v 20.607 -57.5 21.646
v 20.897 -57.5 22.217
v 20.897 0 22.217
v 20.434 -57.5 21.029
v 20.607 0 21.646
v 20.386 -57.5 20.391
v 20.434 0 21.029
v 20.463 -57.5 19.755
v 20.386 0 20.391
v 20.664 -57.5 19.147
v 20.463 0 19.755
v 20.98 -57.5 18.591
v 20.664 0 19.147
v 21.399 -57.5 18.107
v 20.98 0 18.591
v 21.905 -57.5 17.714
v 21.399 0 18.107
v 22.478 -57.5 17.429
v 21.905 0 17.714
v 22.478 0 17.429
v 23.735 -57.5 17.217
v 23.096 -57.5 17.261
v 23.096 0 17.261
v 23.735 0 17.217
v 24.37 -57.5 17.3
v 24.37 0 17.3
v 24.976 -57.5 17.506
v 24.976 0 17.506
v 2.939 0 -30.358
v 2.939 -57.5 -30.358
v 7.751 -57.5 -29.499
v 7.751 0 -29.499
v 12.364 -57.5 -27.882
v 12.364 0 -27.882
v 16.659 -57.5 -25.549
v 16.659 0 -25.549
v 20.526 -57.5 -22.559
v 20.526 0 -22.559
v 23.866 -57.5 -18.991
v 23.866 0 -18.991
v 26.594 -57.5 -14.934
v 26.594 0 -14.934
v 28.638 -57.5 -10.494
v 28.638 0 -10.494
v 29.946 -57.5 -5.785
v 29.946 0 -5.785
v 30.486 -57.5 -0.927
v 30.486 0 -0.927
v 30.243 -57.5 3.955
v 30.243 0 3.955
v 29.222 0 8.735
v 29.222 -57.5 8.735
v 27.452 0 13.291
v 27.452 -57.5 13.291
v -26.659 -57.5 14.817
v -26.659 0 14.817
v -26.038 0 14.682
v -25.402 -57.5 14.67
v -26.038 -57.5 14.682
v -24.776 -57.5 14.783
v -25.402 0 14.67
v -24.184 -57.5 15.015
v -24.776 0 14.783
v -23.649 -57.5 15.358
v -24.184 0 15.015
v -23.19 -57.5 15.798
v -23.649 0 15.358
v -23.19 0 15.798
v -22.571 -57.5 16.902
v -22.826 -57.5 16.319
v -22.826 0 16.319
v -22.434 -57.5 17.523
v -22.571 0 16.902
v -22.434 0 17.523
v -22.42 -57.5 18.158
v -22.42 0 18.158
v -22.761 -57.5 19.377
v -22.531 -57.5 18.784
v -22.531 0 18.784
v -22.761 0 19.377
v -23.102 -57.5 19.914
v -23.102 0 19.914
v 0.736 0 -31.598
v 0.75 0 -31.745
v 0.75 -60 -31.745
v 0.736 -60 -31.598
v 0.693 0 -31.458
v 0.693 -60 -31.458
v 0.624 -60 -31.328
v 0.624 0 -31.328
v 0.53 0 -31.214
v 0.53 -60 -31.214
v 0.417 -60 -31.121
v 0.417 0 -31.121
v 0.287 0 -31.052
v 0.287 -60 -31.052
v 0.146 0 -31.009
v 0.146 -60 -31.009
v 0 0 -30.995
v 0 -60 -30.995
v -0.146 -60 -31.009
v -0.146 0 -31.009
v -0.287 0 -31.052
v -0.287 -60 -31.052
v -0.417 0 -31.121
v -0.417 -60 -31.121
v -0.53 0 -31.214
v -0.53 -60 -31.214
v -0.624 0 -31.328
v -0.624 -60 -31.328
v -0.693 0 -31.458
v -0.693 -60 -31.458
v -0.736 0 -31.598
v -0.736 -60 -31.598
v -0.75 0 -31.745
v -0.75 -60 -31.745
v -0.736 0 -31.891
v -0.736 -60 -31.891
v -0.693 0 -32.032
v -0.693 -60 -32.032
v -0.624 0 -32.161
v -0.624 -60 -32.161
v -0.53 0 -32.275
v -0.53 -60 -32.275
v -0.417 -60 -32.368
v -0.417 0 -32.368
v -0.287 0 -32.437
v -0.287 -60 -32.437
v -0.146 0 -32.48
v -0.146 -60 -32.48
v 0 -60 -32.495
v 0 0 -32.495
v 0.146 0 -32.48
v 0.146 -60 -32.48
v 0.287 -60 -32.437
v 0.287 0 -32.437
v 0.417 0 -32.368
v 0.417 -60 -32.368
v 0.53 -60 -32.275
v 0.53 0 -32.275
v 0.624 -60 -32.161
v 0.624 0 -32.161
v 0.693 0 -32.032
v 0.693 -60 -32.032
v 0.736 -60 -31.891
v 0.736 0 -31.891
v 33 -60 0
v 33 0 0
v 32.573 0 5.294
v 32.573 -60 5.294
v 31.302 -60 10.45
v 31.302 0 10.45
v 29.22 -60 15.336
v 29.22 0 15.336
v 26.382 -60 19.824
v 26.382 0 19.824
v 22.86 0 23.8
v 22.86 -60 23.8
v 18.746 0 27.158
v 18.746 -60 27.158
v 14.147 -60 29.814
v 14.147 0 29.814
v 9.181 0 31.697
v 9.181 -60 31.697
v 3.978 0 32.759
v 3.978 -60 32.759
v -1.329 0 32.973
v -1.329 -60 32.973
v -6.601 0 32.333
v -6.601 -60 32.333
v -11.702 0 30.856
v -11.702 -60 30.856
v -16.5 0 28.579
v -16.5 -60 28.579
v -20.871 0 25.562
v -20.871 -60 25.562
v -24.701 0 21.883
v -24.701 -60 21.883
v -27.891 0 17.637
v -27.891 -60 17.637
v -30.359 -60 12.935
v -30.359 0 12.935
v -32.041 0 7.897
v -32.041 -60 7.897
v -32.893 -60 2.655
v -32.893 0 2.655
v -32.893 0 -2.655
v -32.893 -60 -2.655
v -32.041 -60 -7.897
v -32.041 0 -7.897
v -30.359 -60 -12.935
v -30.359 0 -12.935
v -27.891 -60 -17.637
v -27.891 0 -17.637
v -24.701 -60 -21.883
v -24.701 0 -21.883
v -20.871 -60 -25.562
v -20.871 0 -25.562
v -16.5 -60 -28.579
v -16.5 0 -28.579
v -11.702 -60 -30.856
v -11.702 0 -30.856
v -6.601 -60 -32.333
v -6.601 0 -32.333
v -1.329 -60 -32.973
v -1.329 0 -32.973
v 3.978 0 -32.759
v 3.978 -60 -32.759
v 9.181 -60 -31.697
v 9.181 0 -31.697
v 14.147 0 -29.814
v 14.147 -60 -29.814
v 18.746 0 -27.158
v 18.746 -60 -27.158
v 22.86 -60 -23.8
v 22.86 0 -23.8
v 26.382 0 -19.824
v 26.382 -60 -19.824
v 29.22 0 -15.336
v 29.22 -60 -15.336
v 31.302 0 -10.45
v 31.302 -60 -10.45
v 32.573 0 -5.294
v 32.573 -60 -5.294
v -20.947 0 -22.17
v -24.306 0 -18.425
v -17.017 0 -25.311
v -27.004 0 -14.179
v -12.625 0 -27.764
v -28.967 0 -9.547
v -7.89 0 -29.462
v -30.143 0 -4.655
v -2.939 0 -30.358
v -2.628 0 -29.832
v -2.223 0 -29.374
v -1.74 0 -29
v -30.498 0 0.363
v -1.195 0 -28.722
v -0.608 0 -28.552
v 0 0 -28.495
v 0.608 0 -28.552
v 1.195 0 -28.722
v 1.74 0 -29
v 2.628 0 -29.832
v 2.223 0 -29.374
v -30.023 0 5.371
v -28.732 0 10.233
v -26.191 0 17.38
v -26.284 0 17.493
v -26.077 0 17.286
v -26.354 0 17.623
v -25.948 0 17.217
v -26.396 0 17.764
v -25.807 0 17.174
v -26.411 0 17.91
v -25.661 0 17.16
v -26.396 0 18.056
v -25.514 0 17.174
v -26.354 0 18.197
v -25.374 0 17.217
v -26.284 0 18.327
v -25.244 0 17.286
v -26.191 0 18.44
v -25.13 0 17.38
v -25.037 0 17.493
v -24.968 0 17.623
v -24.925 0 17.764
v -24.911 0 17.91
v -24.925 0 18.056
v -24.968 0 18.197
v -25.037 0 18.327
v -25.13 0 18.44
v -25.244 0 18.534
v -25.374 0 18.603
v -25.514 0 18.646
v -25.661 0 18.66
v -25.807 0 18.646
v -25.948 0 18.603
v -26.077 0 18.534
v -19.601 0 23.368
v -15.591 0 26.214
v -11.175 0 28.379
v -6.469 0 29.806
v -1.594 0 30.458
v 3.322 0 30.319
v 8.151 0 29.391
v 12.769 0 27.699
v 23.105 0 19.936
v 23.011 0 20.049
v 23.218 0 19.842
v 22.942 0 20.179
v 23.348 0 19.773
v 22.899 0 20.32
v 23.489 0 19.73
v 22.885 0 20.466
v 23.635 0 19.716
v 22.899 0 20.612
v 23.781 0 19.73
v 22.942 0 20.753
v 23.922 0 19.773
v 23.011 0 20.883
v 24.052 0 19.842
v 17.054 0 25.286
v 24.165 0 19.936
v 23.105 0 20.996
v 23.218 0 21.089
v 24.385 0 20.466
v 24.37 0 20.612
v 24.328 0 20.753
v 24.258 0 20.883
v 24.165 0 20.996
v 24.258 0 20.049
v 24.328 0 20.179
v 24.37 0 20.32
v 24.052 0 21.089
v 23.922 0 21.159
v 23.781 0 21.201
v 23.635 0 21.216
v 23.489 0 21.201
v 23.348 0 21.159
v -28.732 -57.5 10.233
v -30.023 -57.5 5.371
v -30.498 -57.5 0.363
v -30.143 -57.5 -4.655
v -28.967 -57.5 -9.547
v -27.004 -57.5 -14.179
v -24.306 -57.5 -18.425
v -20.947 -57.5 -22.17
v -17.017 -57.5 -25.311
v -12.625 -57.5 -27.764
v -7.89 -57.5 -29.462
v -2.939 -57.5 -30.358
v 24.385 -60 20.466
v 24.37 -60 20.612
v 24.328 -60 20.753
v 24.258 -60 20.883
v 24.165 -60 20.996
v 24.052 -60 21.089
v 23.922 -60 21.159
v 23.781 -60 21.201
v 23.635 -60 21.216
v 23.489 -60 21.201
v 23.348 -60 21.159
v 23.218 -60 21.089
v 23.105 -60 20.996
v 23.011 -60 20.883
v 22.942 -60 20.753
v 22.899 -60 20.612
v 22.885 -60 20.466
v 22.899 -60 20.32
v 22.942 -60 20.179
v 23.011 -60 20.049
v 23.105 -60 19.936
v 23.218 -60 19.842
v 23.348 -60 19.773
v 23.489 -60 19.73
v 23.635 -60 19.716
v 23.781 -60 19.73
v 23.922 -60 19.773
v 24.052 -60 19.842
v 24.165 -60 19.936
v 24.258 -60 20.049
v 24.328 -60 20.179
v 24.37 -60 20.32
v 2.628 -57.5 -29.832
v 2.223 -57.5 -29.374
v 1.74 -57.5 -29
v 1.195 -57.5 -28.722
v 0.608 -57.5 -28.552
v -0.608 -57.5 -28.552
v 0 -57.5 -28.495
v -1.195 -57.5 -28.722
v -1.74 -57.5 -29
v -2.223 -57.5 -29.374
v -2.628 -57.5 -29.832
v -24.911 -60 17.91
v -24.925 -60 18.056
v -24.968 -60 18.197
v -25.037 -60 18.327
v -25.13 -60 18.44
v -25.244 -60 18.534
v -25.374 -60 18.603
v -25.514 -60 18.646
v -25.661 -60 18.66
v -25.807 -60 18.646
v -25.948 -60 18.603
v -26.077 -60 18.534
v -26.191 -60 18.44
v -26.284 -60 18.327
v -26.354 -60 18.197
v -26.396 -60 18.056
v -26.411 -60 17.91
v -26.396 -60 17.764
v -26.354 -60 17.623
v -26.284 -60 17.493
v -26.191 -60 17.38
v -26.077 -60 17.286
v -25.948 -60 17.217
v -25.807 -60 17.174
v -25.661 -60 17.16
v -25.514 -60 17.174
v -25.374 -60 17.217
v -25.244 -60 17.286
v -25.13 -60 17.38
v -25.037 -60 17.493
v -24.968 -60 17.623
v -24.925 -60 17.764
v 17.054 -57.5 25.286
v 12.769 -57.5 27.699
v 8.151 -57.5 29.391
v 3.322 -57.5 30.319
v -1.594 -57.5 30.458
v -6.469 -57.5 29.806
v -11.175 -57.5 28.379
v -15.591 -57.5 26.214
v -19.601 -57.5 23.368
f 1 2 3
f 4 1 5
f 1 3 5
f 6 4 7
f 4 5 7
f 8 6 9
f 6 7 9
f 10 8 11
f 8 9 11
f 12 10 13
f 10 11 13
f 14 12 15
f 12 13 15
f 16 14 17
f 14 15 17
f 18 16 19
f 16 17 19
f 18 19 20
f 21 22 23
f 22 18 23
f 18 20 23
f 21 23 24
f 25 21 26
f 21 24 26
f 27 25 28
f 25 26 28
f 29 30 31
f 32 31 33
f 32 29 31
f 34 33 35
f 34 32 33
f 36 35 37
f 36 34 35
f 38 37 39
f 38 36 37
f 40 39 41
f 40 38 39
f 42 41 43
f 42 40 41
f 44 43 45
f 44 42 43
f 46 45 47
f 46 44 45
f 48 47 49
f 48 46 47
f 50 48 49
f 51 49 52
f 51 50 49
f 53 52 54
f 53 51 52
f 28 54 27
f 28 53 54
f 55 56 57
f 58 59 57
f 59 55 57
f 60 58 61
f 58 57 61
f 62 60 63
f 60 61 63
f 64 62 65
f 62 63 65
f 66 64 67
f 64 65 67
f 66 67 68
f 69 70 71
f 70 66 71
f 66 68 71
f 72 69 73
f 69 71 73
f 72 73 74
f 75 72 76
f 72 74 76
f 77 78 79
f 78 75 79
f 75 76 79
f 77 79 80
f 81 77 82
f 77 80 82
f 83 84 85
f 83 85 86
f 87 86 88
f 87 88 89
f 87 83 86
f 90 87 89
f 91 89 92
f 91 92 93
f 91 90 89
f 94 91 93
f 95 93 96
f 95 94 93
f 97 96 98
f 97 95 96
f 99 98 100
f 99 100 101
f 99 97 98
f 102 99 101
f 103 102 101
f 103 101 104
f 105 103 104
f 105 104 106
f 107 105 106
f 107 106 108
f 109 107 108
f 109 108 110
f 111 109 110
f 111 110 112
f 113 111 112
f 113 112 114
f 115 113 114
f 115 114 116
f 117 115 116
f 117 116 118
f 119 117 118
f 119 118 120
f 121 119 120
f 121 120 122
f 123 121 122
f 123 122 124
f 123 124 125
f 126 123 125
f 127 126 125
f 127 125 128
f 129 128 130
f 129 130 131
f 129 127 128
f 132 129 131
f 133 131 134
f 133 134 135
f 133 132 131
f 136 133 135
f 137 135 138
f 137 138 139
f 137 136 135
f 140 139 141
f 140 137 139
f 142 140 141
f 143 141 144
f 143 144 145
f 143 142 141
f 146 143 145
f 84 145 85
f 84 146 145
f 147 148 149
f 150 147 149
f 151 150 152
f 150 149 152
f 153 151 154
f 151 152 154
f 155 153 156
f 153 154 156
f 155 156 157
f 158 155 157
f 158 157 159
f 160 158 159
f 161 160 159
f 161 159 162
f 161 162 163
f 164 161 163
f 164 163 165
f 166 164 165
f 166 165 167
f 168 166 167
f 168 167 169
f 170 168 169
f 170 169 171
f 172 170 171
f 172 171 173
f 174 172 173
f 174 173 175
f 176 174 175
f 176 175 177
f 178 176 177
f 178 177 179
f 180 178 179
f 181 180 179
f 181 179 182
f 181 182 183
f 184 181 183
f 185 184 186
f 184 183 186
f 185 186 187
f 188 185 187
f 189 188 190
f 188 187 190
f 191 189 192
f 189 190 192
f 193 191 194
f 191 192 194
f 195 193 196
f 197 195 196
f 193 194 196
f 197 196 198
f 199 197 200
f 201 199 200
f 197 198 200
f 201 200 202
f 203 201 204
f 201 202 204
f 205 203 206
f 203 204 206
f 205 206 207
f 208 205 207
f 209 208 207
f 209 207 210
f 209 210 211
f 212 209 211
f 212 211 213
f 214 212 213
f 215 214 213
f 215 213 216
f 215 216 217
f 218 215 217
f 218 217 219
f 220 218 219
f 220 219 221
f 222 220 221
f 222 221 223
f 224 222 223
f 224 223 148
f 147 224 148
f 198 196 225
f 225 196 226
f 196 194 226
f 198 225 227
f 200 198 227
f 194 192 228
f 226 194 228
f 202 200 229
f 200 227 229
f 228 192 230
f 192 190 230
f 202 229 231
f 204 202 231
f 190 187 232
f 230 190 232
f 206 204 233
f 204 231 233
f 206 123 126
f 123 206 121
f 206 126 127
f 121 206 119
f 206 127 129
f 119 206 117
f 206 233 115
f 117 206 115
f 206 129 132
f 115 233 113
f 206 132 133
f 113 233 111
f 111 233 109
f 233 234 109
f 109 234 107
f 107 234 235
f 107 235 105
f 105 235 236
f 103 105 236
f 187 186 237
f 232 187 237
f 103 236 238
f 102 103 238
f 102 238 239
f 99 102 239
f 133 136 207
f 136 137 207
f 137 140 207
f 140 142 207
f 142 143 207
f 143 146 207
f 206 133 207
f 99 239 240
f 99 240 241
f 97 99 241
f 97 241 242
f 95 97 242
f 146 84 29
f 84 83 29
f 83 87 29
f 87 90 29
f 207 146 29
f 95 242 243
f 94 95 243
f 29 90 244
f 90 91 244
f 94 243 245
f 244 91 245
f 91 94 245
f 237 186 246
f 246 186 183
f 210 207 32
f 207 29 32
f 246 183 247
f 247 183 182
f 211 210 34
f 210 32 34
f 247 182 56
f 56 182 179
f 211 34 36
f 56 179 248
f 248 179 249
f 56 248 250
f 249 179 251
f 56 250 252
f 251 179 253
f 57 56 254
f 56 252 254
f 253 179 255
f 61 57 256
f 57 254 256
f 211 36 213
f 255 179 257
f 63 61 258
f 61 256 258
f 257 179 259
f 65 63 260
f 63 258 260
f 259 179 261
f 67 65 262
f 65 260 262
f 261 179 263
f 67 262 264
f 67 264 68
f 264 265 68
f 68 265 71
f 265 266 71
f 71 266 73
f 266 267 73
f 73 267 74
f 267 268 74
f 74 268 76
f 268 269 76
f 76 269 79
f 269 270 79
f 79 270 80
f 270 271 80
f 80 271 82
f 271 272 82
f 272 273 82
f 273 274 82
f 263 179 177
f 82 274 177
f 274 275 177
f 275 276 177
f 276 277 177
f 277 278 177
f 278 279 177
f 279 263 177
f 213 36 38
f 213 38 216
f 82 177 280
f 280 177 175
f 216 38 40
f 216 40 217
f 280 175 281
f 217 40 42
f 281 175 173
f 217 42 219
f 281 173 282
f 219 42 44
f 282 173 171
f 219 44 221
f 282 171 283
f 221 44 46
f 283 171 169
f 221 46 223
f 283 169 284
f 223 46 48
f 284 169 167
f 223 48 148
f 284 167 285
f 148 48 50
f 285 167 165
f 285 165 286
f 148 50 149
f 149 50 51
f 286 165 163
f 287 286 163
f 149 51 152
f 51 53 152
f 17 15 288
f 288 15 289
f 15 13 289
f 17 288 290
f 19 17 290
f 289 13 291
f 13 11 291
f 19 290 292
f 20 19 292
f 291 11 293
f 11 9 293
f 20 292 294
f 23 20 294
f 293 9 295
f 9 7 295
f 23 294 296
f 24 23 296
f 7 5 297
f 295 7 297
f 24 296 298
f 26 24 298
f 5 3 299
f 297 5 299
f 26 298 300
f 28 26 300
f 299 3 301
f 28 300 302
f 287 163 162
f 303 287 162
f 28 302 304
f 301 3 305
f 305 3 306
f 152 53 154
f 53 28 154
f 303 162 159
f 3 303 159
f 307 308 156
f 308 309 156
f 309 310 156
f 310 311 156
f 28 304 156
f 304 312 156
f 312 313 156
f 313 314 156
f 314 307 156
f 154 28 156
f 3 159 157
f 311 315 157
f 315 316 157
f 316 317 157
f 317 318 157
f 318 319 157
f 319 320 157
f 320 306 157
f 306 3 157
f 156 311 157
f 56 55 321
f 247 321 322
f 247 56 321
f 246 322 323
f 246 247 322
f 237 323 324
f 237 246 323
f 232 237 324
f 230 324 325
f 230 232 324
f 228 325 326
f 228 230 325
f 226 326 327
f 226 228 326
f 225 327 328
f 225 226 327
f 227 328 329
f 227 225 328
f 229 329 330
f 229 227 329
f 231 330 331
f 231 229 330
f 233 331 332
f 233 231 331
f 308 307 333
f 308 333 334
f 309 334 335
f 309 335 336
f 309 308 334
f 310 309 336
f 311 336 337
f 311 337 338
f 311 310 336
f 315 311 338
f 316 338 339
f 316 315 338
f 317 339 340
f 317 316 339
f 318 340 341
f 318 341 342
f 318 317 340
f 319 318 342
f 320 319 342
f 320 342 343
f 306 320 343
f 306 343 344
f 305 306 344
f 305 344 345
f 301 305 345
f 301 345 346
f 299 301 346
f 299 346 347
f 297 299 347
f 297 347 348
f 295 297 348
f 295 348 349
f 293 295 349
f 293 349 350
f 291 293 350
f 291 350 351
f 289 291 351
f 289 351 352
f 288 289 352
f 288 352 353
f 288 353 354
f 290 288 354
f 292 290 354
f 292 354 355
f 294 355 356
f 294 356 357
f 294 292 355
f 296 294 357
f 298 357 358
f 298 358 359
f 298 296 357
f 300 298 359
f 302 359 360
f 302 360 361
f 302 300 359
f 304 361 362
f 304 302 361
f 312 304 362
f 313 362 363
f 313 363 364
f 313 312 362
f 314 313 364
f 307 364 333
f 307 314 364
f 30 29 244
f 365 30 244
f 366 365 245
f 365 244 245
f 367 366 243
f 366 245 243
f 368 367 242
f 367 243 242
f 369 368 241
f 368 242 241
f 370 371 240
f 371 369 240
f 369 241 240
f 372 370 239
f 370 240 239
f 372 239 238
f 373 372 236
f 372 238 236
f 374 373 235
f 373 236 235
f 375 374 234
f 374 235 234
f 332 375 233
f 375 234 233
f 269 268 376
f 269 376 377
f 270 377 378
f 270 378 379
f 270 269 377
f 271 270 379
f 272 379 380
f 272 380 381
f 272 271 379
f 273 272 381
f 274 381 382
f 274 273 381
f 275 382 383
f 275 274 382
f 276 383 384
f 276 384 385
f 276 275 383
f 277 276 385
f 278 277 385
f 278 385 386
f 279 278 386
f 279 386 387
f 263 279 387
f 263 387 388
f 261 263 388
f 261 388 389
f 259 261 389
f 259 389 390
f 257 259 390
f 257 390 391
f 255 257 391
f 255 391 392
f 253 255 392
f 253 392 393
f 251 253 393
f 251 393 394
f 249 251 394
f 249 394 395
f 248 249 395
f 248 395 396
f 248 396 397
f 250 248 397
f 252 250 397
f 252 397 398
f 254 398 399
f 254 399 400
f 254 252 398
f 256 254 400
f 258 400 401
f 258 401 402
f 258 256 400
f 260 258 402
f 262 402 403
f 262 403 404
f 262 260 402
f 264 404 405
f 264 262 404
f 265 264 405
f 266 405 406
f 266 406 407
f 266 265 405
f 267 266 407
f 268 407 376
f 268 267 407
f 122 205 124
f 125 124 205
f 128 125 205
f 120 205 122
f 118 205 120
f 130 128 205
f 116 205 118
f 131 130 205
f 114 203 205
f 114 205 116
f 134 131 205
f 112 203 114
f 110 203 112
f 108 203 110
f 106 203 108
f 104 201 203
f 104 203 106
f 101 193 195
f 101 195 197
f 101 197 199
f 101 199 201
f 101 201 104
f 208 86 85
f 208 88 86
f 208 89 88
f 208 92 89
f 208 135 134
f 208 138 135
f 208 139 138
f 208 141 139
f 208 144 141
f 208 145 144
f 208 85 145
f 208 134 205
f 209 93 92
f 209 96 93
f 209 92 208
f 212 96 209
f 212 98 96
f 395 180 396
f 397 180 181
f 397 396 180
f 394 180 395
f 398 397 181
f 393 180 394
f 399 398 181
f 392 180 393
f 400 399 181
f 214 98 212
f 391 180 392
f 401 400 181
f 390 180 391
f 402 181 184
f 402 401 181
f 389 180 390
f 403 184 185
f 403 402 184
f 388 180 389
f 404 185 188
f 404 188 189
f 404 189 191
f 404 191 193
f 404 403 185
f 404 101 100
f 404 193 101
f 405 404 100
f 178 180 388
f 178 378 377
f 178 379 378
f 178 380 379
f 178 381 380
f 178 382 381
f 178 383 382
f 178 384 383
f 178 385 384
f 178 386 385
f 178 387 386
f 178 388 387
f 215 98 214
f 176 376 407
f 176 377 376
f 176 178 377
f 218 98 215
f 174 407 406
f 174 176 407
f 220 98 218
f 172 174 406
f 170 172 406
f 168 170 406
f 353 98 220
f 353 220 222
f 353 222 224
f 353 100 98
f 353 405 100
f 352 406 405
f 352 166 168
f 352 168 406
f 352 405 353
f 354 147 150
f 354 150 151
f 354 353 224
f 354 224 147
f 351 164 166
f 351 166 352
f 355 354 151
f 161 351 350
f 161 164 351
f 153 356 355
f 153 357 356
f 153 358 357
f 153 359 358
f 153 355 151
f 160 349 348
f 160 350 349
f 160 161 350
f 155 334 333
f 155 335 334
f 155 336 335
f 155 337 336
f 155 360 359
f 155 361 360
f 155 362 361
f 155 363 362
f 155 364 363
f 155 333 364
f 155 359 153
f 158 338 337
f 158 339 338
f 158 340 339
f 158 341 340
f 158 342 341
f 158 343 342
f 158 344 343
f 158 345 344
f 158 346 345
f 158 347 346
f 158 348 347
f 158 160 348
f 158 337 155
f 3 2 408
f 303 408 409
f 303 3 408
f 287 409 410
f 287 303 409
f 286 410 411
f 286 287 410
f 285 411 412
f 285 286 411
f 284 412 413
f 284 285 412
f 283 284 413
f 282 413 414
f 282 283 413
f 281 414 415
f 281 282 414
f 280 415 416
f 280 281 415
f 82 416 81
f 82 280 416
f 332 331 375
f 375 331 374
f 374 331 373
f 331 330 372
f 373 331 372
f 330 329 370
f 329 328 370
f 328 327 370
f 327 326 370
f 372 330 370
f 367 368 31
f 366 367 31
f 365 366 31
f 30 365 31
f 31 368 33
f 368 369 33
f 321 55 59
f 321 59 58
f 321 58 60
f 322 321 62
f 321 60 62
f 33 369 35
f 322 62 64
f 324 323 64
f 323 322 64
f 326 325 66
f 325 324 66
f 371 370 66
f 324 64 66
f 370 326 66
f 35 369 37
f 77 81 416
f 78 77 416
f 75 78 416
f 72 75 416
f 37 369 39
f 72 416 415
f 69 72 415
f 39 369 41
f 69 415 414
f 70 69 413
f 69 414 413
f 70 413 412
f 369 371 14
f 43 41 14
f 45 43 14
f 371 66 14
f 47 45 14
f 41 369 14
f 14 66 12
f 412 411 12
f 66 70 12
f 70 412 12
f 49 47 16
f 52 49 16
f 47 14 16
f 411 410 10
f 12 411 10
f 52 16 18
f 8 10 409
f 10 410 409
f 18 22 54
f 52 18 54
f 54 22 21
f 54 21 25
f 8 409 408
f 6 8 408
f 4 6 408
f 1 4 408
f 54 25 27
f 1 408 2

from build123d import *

# Parameters (mm, degrees)
F0_R     = 33
F0_R_2   = 0.75
F0_R_3   = 30
F1_DEPTH = 60
F2_DEPTH = 3
F3_T     = -2.5


with BuildPart() as f1:
    # F0 (on Front) → F1 (new body)
    with BuildSketch(Plane.XZ):
        Circle(F0_R)
        with Locations((0, -31.744543)):
            Circle(F0_R_2, mode=Mode.SUBTRACT)
        with Locations((-25.660656, 17.90996)):
            Circle(F0_R_2, mode=Mode.SUBTRACT)
        Circle(F0_R_3, mode=Mode.SUBTRACT)
        with Locations((23.63484, 20.465862)):
            Circle(F0_R_2, mode=Mode.SUBTRACT)
        Circle(F0_R_3)
    extrude(amount=F1_DEPTH)

    # F0 (on Front) → F2 (join)
    with BuildSketch(Plane.XZ):
        Circle(F0_R)
        with Locations((0, -31.744543)):
            Circle(F0_R_2, mode=Mode.SUBTRACT)
        with Locations((-25.660656, 17.90996)):
            Circle(F0_R_2, mode=Mode.SUBTRACT)
        Circle(F0_R_3, mode=Mode.SUBTRACT)
        with Locations((23.63484, 20.465862)):
            Circle(F0_R_2, mode=Mode.SUBTRACT)
    extrude(amount=F2_DEPTH)

    # F3
    f3_openings = [f1.faces().sort_by_distance(p)[0] for p in [
        (0.001048, 0, -0.003431),
    ]]
    offset(amount=F3_T, openings=f3_openings)


solid = f1.part
